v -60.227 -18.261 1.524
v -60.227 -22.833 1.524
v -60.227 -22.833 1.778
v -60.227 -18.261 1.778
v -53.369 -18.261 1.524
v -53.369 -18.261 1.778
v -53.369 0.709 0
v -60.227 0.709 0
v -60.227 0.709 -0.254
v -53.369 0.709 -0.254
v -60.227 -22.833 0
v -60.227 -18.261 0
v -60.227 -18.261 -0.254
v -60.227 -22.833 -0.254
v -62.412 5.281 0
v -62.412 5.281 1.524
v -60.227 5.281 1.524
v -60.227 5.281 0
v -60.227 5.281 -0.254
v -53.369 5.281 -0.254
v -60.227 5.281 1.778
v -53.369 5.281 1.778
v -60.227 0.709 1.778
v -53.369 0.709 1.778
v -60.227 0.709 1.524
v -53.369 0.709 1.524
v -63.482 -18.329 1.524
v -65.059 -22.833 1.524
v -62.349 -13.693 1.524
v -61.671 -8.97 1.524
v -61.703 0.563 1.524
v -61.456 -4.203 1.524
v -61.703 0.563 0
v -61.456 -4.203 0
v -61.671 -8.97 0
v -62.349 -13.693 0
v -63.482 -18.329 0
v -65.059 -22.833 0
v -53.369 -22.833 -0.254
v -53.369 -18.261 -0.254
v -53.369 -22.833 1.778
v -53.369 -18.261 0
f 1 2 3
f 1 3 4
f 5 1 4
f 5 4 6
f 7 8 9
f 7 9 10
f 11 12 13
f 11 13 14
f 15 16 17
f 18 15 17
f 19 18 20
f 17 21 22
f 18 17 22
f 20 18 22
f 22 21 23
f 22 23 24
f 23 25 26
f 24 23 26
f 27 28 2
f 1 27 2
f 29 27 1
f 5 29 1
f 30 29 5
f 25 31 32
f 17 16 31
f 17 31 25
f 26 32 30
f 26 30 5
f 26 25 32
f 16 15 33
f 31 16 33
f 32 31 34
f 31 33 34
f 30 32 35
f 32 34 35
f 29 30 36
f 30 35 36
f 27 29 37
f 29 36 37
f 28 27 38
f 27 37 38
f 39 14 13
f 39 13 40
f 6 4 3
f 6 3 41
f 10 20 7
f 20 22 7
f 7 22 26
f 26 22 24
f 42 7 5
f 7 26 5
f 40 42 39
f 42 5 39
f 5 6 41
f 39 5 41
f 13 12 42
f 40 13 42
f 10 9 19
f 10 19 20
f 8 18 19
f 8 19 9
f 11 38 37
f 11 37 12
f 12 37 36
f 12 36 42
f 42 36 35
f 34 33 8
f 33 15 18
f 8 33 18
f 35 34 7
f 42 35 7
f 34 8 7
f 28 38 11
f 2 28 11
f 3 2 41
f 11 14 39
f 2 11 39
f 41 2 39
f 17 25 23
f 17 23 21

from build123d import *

# Parameters (mm, degrees)
F1_DEPTH = 1.524
F2_W     = 6.858
F2_H     = 4.572
F3_DEPTH = 0.254
F4_W     = 6.858
F4_H     = 4.572
F5_DEPTH = 0.254


with BuildPart() as f1:
    # F0 (on Top) → F1 (new body)
    with BuildSketch(Plane.XY):
        with BuildLine():
            Line((-53.369354, -22.832613), (-53.369354, 5.281494))
            Line((-53.369354, 5.281494), (-62.412295, 5.281494))
            ThreePointArc((-62.412295, 5.281494), (-61.67148, -8.969847), (-65.058701, -22.832613))
            Line((-65.058701, -22.832613), (-53.369354, -22.832613))
        make_face()
    extrude(amount=F1_DEPTH)

    # F2 (on face) → F3 (join)
    with BuildSketch(Plane.XY.offset(1.524)):
        with Locations((-56.798354, 2.995494)):
            Rectangle(F2_W, F2_H)
        with Locations((-56.798354, -20.546613)):
            Rectangle(F2_W, F2_H)
    extrude(amount=F3_DEPTH)

    # F4 (on face) → F5 (join)
    with BuildSketch(Plane(origin=(0, 0, 0), x_dir=(1, 0, 0), z_dir=(0, 0, -1))):
        with Locations((-56.798354, -2.995494)):
            Rectangle(F4_W, F4_H)
        with Locations((-56.798354, 20.546613)):
            Rectangle(F4_W, F4_H)
    extrude(amount=F5_DEPTH)


solid = f1.part
